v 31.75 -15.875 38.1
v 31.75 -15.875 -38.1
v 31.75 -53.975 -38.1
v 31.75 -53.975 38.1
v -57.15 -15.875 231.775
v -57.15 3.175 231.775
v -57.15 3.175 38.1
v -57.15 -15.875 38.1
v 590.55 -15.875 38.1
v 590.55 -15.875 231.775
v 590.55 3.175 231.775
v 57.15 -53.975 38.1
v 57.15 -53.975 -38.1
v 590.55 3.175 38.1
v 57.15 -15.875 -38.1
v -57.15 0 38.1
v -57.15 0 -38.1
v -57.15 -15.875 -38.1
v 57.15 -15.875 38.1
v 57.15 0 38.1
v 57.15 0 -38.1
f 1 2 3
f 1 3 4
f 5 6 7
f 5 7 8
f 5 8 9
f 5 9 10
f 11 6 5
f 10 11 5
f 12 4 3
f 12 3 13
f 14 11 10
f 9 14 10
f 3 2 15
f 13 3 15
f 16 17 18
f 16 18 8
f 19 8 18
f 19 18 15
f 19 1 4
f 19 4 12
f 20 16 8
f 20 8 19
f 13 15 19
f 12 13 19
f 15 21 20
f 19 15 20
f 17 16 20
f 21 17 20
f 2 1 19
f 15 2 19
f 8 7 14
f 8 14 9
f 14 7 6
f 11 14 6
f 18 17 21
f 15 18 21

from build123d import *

# Parameters (mm, degrees)
F0_W     = 114.3
F0_H     = 76.2
F1_DEPTH = 15.875
F2_W     = 25.4
F2_H     = 76.2
F3_DEPTH = 38.1
F4_W     = 19.05
F4_H     = 193.675
F5_DEPTH = 647.7


with BuildPart() as f1:
    # F0 (on Front) → F1 (new body)
    with BuildSketch(Plane.XZ):
        Rectangle(F0_W, F0_H)
    extrude(amount=F1_DEPTH)


with BuildPart() as f3:
    # F2 (on face) → F3 (new body)
    with BuildSketch(Plane.XZ.offset(15.875)):
        with Locations((44.45, 0)):
            Rectangle(F2_W, F2_H)
    extrude(amount=F3_DEPTH)


with BuildPart() as f5:
    # F4 (on face) → F5 (new body)
    with BuildSketch(Plane(origin=(-57.15, 0, 0), x_dir=(0, -1, 0), z_dir=(-1, 0, 0))):
        with Locations((6.35, 134.9375)):
            Rectangle(F4_W, F4_H)
    extrude(amount=-F5_DEPTH)


solid = Compound([f1.part, f3.part, f5.part])
